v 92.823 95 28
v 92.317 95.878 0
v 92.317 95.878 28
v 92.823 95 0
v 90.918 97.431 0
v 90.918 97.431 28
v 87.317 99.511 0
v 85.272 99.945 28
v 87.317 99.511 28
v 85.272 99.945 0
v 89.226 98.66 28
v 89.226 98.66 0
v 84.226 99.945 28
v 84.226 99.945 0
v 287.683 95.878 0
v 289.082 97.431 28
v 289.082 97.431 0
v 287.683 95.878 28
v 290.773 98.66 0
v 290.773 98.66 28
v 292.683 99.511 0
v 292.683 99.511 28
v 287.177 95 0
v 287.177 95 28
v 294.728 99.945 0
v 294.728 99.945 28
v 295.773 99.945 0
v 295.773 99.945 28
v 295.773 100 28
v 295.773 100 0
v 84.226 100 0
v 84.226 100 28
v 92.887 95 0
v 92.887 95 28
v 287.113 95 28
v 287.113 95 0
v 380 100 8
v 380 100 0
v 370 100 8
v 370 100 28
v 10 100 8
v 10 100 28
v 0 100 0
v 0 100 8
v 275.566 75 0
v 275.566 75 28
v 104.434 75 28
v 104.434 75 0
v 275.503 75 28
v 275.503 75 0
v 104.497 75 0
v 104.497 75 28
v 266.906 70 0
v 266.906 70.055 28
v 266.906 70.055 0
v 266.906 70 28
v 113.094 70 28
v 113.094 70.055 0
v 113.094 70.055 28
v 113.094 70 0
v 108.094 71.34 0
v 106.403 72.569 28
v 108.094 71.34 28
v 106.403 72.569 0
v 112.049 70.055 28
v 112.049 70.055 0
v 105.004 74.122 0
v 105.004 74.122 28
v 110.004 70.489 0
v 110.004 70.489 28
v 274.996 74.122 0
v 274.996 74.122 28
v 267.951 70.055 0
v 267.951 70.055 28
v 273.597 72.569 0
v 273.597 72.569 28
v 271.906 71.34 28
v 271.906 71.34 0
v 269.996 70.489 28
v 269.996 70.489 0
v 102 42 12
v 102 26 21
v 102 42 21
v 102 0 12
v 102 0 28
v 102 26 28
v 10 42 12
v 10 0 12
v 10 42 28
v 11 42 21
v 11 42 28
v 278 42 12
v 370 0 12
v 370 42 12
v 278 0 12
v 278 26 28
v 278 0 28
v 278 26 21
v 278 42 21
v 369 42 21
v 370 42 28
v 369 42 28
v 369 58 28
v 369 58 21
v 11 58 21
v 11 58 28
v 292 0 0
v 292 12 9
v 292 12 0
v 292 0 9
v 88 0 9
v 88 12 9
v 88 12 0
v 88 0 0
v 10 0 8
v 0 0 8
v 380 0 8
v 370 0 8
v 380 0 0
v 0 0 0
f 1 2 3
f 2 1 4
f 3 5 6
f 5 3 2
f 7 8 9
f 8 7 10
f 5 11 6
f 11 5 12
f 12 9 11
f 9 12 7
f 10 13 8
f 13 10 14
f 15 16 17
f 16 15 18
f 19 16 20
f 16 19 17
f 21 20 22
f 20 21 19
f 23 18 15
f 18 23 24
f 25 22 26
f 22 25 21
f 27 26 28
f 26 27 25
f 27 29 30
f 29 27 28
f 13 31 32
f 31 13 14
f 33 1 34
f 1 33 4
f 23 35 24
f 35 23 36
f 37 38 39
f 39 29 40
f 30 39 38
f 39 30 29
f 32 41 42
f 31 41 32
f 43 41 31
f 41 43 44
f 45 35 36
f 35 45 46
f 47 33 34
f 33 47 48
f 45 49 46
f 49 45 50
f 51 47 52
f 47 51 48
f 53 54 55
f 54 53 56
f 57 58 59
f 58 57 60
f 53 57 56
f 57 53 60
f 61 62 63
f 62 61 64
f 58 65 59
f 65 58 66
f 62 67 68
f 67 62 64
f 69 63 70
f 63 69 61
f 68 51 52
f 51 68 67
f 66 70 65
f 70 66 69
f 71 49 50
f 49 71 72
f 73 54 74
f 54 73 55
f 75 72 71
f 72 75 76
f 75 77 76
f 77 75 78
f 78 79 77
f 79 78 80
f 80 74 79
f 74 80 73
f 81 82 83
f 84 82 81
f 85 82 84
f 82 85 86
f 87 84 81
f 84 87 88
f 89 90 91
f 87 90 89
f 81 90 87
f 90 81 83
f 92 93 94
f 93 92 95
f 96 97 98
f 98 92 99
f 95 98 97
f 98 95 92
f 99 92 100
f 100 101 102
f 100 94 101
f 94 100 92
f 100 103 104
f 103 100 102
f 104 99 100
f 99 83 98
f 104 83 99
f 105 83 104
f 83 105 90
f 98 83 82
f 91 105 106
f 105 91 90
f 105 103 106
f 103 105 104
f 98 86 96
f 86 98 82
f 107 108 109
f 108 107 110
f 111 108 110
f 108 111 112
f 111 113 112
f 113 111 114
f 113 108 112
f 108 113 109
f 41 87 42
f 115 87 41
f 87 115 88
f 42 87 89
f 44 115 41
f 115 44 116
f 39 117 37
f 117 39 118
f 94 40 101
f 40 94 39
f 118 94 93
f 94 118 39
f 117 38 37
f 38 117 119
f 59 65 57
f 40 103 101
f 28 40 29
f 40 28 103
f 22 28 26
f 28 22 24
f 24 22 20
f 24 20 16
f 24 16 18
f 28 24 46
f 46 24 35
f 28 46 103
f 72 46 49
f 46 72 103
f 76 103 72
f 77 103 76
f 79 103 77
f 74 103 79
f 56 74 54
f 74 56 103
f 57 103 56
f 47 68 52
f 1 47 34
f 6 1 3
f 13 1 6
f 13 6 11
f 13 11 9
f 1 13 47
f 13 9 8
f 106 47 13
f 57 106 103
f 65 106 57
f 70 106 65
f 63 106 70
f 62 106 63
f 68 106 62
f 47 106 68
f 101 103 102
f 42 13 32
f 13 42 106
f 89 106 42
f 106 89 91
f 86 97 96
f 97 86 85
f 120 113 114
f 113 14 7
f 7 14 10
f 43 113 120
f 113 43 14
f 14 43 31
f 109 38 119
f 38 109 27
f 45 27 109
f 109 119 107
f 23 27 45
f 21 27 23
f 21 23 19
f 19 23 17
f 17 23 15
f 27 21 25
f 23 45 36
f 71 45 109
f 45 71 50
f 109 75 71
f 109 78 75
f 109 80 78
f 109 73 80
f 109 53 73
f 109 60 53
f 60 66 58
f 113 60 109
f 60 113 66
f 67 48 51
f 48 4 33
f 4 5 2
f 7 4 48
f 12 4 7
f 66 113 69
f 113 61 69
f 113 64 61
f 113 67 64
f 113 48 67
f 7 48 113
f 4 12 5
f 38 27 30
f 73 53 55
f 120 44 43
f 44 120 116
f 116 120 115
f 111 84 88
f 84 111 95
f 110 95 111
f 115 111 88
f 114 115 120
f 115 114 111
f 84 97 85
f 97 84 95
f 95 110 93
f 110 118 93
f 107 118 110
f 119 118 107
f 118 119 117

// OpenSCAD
include <../src/wardrobe.scad>;
plank_yz_side_bottom();
//github_openscad -o wardrobe_2/plank_yz_side_bottom.stl -D wardrobe_n=2 -D cutting_edge=0 -D break_view_length=0 wardrobe_2/plank_yz_side_bottom_stl.scad
